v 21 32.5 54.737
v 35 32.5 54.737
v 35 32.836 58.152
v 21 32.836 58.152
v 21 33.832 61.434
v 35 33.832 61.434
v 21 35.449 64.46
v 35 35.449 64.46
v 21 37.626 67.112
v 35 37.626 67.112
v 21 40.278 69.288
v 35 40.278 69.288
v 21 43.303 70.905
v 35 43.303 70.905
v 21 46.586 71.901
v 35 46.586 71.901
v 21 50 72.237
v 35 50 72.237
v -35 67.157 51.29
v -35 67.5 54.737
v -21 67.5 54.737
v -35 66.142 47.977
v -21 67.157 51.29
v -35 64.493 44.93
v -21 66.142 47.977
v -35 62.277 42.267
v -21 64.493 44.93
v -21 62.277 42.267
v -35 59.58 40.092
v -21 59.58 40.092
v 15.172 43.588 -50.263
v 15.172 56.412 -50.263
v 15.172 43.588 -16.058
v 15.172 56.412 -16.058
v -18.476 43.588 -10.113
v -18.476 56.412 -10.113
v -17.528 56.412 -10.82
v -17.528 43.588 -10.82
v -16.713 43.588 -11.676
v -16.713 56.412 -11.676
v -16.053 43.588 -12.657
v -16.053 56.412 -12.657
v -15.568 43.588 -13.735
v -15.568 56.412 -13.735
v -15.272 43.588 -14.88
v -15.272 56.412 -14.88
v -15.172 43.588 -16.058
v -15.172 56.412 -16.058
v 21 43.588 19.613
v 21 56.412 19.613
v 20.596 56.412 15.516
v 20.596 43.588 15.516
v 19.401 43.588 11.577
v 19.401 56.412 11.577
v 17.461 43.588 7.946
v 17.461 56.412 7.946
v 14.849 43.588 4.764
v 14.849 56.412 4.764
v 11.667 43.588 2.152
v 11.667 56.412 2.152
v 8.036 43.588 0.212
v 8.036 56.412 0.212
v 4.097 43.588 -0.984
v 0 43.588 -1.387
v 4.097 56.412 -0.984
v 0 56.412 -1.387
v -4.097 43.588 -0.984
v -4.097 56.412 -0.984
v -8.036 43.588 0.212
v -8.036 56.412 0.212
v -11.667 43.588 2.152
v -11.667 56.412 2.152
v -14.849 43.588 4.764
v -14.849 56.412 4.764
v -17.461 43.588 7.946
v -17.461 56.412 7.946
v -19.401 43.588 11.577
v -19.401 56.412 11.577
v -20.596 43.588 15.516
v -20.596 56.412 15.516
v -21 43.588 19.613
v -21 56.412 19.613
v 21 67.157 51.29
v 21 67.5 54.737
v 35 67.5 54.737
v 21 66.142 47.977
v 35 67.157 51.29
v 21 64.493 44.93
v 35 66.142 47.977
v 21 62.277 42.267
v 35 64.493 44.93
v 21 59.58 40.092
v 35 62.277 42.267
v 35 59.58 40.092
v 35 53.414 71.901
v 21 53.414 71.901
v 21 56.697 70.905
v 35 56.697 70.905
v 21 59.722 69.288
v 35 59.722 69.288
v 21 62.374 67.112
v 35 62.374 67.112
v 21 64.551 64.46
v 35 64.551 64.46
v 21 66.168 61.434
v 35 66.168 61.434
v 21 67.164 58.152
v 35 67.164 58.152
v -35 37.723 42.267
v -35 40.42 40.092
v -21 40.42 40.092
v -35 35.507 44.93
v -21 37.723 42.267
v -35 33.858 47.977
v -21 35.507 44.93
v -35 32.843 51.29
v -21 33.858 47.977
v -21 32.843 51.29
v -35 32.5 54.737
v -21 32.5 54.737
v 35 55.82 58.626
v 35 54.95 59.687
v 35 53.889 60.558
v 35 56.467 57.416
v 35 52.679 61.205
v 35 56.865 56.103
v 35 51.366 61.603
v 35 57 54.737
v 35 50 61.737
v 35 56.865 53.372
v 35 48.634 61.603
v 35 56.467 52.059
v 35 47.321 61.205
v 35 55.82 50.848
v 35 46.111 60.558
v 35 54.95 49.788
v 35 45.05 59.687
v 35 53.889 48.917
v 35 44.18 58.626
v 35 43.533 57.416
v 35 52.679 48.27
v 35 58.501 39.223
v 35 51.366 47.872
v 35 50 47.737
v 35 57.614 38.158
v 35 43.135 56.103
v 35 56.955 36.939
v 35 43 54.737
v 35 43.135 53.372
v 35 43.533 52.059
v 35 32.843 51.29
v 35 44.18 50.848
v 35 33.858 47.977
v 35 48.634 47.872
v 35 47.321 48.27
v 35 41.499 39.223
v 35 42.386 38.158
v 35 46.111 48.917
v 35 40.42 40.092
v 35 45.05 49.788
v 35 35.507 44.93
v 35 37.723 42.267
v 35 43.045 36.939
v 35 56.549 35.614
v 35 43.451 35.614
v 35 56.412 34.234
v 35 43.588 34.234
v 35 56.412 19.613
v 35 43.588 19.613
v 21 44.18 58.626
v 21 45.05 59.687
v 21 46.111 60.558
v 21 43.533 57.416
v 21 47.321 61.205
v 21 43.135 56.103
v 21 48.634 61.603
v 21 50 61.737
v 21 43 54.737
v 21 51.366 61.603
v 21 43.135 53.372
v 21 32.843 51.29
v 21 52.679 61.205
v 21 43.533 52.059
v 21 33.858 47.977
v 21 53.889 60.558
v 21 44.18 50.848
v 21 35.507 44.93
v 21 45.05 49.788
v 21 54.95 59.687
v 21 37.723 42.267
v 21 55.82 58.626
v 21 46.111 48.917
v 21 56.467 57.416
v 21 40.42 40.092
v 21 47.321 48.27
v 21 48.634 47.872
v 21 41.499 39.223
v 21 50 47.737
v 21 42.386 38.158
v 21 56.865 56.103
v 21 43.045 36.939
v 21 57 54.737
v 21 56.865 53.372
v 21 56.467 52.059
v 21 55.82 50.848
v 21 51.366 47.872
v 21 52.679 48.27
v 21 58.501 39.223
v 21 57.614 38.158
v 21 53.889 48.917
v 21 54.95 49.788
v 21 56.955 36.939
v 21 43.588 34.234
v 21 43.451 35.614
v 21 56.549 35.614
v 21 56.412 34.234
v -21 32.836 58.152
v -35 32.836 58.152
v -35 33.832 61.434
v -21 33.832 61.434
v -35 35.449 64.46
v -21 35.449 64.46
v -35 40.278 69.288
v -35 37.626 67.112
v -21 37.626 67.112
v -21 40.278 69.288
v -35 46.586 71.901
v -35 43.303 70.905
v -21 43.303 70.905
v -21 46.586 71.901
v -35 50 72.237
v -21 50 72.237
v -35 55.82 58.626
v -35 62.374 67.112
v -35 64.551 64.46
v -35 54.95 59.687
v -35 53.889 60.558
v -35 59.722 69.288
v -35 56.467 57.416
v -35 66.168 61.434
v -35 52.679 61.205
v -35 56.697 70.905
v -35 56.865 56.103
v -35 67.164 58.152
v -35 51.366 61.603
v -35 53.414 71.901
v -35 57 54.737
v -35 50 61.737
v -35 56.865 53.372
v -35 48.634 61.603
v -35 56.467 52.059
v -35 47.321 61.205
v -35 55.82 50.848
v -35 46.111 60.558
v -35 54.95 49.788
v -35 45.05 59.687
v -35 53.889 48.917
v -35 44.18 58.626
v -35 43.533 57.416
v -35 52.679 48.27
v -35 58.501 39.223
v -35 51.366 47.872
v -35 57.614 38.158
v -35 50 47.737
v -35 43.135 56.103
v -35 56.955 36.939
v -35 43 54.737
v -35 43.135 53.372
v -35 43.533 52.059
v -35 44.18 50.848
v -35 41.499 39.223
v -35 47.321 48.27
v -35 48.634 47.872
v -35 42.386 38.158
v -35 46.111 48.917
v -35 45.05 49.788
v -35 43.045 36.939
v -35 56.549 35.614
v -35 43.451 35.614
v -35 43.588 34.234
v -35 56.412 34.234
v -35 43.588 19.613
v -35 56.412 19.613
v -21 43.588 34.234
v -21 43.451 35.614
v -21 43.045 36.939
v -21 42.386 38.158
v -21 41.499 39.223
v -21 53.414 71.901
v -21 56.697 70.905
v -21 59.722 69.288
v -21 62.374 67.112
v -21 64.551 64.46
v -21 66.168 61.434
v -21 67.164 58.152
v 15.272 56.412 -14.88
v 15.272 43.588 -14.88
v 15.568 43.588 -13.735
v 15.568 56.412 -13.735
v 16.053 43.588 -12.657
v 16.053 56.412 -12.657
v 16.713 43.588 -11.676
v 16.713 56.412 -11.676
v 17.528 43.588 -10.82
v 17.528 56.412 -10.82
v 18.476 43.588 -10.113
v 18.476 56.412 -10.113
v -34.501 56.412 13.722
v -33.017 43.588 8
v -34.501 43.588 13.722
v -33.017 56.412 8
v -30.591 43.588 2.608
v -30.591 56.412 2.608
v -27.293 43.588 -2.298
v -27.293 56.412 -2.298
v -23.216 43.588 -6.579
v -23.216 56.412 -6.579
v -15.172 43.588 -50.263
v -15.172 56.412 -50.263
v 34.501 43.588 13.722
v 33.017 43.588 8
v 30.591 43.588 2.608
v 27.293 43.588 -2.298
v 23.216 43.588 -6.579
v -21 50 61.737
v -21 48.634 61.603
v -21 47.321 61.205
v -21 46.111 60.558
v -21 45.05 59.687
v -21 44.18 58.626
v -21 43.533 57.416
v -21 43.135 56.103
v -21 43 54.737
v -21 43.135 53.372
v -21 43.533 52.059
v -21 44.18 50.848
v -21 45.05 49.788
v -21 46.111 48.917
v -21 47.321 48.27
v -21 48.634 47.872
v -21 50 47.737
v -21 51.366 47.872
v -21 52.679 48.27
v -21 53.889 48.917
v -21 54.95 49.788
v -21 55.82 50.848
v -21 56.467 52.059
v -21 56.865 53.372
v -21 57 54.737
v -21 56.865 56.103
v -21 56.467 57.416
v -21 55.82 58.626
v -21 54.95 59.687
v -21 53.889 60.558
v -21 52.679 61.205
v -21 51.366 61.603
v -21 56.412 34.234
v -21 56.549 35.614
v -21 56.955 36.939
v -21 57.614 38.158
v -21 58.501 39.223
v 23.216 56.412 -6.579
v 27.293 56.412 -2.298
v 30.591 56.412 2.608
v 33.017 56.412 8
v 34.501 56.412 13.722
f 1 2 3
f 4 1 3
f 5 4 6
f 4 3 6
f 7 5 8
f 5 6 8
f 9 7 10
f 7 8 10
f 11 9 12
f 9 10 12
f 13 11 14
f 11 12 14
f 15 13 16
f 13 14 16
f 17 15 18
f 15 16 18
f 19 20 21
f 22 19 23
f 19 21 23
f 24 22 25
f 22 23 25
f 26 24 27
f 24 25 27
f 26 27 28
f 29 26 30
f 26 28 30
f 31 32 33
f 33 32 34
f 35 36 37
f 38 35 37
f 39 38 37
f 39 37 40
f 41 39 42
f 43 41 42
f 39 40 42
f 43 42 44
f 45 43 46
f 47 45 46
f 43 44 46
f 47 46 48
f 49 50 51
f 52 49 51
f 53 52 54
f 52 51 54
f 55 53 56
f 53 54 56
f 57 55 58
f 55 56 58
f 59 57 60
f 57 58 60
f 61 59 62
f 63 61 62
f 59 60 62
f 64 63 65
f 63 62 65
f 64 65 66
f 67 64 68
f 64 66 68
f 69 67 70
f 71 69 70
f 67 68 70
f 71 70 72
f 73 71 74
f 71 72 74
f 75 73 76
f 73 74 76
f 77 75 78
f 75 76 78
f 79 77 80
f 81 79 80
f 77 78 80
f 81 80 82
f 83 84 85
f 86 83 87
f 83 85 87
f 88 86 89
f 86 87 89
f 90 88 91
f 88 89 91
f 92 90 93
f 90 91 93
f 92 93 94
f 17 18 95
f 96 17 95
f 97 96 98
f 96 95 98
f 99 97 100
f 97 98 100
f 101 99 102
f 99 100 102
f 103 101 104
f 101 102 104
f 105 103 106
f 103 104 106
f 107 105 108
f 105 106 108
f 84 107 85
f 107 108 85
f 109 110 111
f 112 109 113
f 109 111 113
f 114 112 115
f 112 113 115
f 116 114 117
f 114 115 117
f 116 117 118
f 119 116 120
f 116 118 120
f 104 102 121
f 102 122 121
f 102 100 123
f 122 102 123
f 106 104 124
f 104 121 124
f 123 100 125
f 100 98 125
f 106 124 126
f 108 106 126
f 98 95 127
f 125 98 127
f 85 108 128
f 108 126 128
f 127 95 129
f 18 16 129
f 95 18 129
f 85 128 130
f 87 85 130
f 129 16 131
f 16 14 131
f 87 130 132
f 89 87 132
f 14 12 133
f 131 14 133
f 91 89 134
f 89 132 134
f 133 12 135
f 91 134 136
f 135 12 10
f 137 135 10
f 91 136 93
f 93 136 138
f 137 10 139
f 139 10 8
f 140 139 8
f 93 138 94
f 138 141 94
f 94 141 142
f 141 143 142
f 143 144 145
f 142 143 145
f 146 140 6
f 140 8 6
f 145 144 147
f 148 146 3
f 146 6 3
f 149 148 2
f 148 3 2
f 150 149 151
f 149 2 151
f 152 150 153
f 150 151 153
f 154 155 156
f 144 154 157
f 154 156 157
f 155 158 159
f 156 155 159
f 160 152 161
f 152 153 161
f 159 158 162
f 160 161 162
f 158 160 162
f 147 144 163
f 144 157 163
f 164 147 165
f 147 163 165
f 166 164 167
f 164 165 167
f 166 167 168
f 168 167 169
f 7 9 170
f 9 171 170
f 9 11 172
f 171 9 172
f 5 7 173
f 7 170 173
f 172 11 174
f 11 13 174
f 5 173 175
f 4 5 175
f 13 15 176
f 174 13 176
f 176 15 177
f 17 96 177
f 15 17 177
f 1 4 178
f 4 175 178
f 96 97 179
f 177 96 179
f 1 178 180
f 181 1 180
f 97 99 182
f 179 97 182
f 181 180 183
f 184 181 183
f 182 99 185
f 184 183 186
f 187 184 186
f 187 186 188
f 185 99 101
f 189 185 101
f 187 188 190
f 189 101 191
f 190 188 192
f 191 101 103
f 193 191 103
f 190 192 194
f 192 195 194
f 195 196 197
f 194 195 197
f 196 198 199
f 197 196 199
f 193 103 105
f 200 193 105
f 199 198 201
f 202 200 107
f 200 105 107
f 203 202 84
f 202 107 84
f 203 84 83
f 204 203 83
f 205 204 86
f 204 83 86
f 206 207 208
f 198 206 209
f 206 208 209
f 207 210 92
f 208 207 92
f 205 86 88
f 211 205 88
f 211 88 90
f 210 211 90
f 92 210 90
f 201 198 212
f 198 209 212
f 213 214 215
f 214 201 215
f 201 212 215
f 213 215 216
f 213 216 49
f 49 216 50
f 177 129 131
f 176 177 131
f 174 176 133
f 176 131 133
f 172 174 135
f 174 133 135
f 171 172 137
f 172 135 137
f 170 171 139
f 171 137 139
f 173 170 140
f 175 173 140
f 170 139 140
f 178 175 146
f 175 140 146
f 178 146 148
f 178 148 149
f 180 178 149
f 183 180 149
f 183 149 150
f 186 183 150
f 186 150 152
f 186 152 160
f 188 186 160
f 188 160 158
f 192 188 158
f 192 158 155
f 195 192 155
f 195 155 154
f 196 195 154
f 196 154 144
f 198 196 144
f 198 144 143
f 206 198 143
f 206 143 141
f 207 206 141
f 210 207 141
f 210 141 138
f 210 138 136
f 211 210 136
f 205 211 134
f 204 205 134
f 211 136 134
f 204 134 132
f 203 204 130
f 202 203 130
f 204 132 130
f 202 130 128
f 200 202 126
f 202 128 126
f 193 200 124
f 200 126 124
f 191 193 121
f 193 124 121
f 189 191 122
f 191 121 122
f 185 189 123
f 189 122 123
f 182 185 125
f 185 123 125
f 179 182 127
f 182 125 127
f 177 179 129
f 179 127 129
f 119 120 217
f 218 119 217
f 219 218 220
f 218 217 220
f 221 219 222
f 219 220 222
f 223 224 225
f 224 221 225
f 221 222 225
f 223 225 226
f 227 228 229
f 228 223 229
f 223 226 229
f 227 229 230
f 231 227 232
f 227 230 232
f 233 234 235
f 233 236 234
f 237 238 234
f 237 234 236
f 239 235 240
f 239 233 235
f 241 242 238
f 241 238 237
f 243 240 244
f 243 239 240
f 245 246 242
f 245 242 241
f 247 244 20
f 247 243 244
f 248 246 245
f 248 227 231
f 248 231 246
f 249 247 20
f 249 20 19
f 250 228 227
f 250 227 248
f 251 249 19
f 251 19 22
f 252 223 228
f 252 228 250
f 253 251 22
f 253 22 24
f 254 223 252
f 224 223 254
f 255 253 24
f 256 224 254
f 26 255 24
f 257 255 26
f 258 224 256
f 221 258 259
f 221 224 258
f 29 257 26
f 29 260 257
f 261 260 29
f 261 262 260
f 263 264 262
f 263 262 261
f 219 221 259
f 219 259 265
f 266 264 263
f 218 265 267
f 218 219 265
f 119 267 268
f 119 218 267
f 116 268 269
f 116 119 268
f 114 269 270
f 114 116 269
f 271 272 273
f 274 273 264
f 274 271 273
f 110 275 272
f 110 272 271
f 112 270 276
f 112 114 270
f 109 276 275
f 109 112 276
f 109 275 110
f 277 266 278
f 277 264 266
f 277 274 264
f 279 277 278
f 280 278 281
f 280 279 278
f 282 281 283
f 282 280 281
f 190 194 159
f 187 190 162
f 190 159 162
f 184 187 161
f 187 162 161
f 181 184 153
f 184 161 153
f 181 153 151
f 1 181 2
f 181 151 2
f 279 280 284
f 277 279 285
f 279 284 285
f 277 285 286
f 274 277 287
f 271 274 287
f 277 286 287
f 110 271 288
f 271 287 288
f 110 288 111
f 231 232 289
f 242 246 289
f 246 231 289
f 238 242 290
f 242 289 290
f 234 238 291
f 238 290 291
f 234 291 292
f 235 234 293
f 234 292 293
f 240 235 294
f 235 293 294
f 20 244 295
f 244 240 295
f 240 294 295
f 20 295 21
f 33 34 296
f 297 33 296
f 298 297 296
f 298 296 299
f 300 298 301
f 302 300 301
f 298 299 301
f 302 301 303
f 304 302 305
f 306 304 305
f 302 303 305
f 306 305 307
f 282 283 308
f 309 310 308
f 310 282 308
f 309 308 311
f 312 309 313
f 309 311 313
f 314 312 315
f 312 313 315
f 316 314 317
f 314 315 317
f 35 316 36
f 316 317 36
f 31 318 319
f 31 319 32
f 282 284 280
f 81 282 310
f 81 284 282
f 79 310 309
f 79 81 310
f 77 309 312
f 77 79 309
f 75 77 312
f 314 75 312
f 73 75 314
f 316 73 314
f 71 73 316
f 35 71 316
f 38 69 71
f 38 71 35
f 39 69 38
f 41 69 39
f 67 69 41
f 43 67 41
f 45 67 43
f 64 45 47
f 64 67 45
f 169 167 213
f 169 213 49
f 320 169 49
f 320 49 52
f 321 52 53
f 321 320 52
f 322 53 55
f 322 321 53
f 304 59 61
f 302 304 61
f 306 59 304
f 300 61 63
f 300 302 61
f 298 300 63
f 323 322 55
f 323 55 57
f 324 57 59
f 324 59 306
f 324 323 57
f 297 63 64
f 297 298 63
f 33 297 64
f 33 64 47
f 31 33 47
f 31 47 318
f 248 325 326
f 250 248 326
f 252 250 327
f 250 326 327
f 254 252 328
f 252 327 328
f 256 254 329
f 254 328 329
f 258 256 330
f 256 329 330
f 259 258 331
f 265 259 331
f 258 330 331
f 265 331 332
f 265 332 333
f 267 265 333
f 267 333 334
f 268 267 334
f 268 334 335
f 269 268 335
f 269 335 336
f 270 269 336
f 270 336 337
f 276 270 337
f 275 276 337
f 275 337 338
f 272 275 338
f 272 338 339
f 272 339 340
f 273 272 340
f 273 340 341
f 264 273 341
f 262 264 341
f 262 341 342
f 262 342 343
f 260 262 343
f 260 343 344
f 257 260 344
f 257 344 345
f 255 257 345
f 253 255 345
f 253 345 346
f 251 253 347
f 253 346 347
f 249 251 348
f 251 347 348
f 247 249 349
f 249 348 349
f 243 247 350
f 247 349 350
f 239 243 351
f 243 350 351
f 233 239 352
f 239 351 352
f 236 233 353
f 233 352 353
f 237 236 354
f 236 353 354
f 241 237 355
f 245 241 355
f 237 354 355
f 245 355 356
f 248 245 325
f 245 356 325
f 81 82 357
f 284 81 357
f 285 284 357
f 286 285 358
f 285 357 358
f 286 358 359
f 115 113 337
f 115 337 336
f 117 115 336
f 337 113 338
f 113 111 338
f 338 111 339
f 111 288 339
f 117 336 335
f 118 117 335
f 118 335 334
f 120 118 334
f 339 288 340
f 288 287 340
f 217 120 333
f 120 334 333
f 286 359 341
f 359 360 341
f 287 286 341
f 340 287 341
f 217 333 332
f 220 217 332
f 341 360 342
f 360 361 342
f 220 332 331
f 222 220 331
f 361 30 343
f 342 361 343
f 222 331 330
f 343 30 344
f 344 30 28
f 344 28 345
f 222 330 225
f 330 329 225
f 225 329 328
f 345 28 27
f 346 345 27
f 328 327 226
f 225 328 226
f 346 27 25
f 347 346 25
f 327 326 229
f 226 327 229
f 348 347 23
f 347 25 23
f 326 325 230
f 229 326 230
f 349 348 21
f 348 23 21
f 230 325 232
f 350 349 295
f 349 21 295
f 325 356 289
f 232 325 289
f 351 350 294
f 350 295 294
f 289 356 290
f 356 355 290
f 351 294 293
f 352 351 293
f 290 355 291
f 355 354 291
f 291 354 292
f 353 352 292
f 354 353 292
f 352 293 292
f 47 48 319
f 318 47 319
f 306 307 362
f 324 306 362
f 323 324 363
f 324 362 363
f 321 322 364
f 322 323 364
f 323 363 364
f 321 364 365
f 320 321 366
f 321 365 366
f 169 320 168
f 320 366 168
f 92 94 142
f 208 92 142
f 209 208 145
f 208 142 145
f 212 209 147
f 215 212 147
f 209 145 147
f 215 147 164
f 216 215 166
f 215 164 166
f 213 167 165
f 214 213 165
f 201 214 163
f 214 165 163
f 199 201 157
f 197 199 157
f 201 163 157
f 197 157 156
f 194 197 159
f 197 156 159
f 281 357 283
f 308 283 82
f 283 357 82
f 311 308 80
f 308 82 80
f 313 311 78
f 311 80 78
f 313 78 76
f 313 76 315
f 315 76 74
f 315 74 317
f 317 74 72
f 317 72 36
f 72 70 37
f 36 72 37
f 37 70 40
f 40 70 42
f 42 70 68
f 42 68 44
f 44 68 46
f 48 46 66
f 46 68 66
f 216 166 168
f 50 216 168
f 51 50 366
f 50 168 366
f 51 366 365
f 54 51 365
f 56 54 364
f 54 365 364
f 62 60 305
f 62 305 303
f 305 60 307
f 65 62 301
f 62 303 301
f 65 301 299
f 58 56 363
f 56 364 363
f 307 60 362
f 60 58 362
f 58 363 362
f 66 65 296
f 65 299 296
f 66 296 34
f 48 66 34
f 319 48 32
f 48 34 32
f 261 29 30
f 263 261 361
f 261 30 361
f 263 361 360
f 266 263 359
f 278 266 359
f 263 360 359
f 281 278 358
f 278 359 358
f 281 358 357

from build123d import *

# Parameters (mm, degrees)
SKETCH2_W           = 200
SKETCH2_H           = 350
BOSS_EXTRUDE1_DEPTH = 100
CUT_EXTRUDE3_DEPTH  = 226
SKETCH5_W           = 97.727308895
SKETCH5_H           = 31.680459025
CUT_EXTRUDE4_DEPTH  = 284.94541729
SCALE1_SCALE        = 0.35


with BuildPart() as part:
    # Sketch2 → Boss-Extrude1 (new body)
    with BuildSketch(Plane(origin=(0, 0, 0), x_dir=(1, 0, 0), z_dir=(0, 1, 0))):
        Rectangle(SKETCH2_W, SKETCH2_H)
    extrude(amount=BOSS_EXTRUDE1_DEPTH)

    # Sketch4 → Cut-Extrude3 (cut, through all)
    with BuildSketch(Plane(origin=(0, 100, 0), x_dir=(1, 0, 0), z_dir=(0, 1, 0))):
        with BuildLine():
            Line((100, 175), (43.347633031, 175))
            Line((43.347633031, 175), (43.347633031, 77.272691105))
            ThreePointArc((43.347633031, 77.272691105), (45.866803863, 67.555664213), (52.789694192, 60.286522394))
            ThreePointArc((52.789694192, 60.286522394), (87.404145859, 23.940813259), (100, -24.644321249))
            Line((100, -24.644321249), (100, 175))
        make_face()
        with BuildLine():
            Line((-43.347633031, 77.272691105), (-43.347633031, 175))
            Line((-43.347633031, 175), (-100, 175))
            Line((-100, 175), (-100, -24.644321206))
            ThreePointArc((-100, -24.644321206), (-87.404145849, 23.940813278), (-52.789694192, 60.286522394))
            ThreePointArc((-52.789694192, 60.286522394), (-45.866803863, 67.555664213), (-43.347633031, 77.272691105))
        make_face()
        with BuildLine():
            Line((60, -175), (60, -24.644321162))
            ThreePointArc((60, -24.644321162), (0, 35.355678838), (-60, -24.644321162))
            Line((-60, -24.644321162), (-60, -175))
            Line((-60, -175), (60, -175))
        make_face()
    extrude(amount=-CUT_EXTRUDE3_DEPTH, mode=Mode.SUBTRACT)

    # Sketch5 → Cut-Extrude4 (cut, through all)
    with BuildSketch(Plane(origin=(100, 0, 0), x_dir=(0, 0, -1), z_dir=(1, 0, 0))):
        with BuildLine():
            Line((-175, 100), (-175, 50))
            ThreePointArc((-175, 50), (-160.355339059, 85.355339059), (-125, 100))
            Line((-125, 100), (-175, 100))
        make_face()
        with BuildLine():
            ThreePointArc((-105, 50), (-125, 70), (-145, 50))
            Line((-145, 50), (-105, 50))
        make_face()
        with BuildLine():
            Line((-105, 50), (-145, 50))
            ThreePointArc((-145, 50), (-125, 30), (-105, 50))
        make_face()
        with BuildLine():
            ThreePointArc((-125, 0), (-160.355339059, 14.644660941), (-175, 50))
            Line((-175, 50), (-175, 0))
            Line((-175, 0), (-125, 0))
        make_face()
        with BuildLine():
            ThreePointArc((-83.15716493, 22.628899304), (-101.215078672, 6.019578022), (-125, 0))
            Line((-125, 0), (-24.644321162, 0))
            Line((-24.644321162, 0), (-24.644321162, 31.680459025))
            Line((-24.644321162, 31.680459025), (-66.420030902, 31.680459025))
            ThreePointArc((-66.420030902, 31.680459025), (-75.933999434, 29.272627817), (-83.15716493, 22.628899304))
        make_face()
        with BuildLine():
            Line((-124.644321162, 100), (-125, 100))
            ThreePointArc((-125, 100), (-101.215078672, 93.980421978), (-83.15716493, 77.371100696))
            ThreePointArc((-83.15716493, 77.371100696), (-75.933999434, 70.727372183), (-66.420030902, 68.319540975))
            Line((-66.420030902, 68.319540975), (-24.644321162, 68.319540975))
            Line((-24.644321162, 68.319540975), (-24.644321162, 100))
            Line((-24.644321162, 100), (-124.644321162, 100))
        make_face()
        Polygon((60.286522394, 100), (-24.644321162, 100), (-24.644321162, 68.319540975), (77.272691105, 68.319540975), (77.272691105, 100), align=None)
        Polygon((-24.644321162, 31.680459025), (-24.644321162, 0), (60.286522394, 0), (77.272691105, 0), (77.272691105, 31.680459025), align=None)
        with Locations((126.136345553, 15.840229513)):
            Rectangle(SKETCH5_W, SKETCH5_H)
        with Locations((126.136345553, 84.159770487)):
            Rectangle(SKETCH5_W, SKETCH5_H)
    extrude(amount=-CUT_EXTRUDE4_DEPTH, mode=Mode.SUBTRACT)


with BuildPart() as part_1:
    # Scale1: scaled about (0, 50, 16.903782196)
    add(part.part.scale(SCALE1_SCALE).moved(Location((0, 32.5, 10.987458427))))


solid = part_1.part
